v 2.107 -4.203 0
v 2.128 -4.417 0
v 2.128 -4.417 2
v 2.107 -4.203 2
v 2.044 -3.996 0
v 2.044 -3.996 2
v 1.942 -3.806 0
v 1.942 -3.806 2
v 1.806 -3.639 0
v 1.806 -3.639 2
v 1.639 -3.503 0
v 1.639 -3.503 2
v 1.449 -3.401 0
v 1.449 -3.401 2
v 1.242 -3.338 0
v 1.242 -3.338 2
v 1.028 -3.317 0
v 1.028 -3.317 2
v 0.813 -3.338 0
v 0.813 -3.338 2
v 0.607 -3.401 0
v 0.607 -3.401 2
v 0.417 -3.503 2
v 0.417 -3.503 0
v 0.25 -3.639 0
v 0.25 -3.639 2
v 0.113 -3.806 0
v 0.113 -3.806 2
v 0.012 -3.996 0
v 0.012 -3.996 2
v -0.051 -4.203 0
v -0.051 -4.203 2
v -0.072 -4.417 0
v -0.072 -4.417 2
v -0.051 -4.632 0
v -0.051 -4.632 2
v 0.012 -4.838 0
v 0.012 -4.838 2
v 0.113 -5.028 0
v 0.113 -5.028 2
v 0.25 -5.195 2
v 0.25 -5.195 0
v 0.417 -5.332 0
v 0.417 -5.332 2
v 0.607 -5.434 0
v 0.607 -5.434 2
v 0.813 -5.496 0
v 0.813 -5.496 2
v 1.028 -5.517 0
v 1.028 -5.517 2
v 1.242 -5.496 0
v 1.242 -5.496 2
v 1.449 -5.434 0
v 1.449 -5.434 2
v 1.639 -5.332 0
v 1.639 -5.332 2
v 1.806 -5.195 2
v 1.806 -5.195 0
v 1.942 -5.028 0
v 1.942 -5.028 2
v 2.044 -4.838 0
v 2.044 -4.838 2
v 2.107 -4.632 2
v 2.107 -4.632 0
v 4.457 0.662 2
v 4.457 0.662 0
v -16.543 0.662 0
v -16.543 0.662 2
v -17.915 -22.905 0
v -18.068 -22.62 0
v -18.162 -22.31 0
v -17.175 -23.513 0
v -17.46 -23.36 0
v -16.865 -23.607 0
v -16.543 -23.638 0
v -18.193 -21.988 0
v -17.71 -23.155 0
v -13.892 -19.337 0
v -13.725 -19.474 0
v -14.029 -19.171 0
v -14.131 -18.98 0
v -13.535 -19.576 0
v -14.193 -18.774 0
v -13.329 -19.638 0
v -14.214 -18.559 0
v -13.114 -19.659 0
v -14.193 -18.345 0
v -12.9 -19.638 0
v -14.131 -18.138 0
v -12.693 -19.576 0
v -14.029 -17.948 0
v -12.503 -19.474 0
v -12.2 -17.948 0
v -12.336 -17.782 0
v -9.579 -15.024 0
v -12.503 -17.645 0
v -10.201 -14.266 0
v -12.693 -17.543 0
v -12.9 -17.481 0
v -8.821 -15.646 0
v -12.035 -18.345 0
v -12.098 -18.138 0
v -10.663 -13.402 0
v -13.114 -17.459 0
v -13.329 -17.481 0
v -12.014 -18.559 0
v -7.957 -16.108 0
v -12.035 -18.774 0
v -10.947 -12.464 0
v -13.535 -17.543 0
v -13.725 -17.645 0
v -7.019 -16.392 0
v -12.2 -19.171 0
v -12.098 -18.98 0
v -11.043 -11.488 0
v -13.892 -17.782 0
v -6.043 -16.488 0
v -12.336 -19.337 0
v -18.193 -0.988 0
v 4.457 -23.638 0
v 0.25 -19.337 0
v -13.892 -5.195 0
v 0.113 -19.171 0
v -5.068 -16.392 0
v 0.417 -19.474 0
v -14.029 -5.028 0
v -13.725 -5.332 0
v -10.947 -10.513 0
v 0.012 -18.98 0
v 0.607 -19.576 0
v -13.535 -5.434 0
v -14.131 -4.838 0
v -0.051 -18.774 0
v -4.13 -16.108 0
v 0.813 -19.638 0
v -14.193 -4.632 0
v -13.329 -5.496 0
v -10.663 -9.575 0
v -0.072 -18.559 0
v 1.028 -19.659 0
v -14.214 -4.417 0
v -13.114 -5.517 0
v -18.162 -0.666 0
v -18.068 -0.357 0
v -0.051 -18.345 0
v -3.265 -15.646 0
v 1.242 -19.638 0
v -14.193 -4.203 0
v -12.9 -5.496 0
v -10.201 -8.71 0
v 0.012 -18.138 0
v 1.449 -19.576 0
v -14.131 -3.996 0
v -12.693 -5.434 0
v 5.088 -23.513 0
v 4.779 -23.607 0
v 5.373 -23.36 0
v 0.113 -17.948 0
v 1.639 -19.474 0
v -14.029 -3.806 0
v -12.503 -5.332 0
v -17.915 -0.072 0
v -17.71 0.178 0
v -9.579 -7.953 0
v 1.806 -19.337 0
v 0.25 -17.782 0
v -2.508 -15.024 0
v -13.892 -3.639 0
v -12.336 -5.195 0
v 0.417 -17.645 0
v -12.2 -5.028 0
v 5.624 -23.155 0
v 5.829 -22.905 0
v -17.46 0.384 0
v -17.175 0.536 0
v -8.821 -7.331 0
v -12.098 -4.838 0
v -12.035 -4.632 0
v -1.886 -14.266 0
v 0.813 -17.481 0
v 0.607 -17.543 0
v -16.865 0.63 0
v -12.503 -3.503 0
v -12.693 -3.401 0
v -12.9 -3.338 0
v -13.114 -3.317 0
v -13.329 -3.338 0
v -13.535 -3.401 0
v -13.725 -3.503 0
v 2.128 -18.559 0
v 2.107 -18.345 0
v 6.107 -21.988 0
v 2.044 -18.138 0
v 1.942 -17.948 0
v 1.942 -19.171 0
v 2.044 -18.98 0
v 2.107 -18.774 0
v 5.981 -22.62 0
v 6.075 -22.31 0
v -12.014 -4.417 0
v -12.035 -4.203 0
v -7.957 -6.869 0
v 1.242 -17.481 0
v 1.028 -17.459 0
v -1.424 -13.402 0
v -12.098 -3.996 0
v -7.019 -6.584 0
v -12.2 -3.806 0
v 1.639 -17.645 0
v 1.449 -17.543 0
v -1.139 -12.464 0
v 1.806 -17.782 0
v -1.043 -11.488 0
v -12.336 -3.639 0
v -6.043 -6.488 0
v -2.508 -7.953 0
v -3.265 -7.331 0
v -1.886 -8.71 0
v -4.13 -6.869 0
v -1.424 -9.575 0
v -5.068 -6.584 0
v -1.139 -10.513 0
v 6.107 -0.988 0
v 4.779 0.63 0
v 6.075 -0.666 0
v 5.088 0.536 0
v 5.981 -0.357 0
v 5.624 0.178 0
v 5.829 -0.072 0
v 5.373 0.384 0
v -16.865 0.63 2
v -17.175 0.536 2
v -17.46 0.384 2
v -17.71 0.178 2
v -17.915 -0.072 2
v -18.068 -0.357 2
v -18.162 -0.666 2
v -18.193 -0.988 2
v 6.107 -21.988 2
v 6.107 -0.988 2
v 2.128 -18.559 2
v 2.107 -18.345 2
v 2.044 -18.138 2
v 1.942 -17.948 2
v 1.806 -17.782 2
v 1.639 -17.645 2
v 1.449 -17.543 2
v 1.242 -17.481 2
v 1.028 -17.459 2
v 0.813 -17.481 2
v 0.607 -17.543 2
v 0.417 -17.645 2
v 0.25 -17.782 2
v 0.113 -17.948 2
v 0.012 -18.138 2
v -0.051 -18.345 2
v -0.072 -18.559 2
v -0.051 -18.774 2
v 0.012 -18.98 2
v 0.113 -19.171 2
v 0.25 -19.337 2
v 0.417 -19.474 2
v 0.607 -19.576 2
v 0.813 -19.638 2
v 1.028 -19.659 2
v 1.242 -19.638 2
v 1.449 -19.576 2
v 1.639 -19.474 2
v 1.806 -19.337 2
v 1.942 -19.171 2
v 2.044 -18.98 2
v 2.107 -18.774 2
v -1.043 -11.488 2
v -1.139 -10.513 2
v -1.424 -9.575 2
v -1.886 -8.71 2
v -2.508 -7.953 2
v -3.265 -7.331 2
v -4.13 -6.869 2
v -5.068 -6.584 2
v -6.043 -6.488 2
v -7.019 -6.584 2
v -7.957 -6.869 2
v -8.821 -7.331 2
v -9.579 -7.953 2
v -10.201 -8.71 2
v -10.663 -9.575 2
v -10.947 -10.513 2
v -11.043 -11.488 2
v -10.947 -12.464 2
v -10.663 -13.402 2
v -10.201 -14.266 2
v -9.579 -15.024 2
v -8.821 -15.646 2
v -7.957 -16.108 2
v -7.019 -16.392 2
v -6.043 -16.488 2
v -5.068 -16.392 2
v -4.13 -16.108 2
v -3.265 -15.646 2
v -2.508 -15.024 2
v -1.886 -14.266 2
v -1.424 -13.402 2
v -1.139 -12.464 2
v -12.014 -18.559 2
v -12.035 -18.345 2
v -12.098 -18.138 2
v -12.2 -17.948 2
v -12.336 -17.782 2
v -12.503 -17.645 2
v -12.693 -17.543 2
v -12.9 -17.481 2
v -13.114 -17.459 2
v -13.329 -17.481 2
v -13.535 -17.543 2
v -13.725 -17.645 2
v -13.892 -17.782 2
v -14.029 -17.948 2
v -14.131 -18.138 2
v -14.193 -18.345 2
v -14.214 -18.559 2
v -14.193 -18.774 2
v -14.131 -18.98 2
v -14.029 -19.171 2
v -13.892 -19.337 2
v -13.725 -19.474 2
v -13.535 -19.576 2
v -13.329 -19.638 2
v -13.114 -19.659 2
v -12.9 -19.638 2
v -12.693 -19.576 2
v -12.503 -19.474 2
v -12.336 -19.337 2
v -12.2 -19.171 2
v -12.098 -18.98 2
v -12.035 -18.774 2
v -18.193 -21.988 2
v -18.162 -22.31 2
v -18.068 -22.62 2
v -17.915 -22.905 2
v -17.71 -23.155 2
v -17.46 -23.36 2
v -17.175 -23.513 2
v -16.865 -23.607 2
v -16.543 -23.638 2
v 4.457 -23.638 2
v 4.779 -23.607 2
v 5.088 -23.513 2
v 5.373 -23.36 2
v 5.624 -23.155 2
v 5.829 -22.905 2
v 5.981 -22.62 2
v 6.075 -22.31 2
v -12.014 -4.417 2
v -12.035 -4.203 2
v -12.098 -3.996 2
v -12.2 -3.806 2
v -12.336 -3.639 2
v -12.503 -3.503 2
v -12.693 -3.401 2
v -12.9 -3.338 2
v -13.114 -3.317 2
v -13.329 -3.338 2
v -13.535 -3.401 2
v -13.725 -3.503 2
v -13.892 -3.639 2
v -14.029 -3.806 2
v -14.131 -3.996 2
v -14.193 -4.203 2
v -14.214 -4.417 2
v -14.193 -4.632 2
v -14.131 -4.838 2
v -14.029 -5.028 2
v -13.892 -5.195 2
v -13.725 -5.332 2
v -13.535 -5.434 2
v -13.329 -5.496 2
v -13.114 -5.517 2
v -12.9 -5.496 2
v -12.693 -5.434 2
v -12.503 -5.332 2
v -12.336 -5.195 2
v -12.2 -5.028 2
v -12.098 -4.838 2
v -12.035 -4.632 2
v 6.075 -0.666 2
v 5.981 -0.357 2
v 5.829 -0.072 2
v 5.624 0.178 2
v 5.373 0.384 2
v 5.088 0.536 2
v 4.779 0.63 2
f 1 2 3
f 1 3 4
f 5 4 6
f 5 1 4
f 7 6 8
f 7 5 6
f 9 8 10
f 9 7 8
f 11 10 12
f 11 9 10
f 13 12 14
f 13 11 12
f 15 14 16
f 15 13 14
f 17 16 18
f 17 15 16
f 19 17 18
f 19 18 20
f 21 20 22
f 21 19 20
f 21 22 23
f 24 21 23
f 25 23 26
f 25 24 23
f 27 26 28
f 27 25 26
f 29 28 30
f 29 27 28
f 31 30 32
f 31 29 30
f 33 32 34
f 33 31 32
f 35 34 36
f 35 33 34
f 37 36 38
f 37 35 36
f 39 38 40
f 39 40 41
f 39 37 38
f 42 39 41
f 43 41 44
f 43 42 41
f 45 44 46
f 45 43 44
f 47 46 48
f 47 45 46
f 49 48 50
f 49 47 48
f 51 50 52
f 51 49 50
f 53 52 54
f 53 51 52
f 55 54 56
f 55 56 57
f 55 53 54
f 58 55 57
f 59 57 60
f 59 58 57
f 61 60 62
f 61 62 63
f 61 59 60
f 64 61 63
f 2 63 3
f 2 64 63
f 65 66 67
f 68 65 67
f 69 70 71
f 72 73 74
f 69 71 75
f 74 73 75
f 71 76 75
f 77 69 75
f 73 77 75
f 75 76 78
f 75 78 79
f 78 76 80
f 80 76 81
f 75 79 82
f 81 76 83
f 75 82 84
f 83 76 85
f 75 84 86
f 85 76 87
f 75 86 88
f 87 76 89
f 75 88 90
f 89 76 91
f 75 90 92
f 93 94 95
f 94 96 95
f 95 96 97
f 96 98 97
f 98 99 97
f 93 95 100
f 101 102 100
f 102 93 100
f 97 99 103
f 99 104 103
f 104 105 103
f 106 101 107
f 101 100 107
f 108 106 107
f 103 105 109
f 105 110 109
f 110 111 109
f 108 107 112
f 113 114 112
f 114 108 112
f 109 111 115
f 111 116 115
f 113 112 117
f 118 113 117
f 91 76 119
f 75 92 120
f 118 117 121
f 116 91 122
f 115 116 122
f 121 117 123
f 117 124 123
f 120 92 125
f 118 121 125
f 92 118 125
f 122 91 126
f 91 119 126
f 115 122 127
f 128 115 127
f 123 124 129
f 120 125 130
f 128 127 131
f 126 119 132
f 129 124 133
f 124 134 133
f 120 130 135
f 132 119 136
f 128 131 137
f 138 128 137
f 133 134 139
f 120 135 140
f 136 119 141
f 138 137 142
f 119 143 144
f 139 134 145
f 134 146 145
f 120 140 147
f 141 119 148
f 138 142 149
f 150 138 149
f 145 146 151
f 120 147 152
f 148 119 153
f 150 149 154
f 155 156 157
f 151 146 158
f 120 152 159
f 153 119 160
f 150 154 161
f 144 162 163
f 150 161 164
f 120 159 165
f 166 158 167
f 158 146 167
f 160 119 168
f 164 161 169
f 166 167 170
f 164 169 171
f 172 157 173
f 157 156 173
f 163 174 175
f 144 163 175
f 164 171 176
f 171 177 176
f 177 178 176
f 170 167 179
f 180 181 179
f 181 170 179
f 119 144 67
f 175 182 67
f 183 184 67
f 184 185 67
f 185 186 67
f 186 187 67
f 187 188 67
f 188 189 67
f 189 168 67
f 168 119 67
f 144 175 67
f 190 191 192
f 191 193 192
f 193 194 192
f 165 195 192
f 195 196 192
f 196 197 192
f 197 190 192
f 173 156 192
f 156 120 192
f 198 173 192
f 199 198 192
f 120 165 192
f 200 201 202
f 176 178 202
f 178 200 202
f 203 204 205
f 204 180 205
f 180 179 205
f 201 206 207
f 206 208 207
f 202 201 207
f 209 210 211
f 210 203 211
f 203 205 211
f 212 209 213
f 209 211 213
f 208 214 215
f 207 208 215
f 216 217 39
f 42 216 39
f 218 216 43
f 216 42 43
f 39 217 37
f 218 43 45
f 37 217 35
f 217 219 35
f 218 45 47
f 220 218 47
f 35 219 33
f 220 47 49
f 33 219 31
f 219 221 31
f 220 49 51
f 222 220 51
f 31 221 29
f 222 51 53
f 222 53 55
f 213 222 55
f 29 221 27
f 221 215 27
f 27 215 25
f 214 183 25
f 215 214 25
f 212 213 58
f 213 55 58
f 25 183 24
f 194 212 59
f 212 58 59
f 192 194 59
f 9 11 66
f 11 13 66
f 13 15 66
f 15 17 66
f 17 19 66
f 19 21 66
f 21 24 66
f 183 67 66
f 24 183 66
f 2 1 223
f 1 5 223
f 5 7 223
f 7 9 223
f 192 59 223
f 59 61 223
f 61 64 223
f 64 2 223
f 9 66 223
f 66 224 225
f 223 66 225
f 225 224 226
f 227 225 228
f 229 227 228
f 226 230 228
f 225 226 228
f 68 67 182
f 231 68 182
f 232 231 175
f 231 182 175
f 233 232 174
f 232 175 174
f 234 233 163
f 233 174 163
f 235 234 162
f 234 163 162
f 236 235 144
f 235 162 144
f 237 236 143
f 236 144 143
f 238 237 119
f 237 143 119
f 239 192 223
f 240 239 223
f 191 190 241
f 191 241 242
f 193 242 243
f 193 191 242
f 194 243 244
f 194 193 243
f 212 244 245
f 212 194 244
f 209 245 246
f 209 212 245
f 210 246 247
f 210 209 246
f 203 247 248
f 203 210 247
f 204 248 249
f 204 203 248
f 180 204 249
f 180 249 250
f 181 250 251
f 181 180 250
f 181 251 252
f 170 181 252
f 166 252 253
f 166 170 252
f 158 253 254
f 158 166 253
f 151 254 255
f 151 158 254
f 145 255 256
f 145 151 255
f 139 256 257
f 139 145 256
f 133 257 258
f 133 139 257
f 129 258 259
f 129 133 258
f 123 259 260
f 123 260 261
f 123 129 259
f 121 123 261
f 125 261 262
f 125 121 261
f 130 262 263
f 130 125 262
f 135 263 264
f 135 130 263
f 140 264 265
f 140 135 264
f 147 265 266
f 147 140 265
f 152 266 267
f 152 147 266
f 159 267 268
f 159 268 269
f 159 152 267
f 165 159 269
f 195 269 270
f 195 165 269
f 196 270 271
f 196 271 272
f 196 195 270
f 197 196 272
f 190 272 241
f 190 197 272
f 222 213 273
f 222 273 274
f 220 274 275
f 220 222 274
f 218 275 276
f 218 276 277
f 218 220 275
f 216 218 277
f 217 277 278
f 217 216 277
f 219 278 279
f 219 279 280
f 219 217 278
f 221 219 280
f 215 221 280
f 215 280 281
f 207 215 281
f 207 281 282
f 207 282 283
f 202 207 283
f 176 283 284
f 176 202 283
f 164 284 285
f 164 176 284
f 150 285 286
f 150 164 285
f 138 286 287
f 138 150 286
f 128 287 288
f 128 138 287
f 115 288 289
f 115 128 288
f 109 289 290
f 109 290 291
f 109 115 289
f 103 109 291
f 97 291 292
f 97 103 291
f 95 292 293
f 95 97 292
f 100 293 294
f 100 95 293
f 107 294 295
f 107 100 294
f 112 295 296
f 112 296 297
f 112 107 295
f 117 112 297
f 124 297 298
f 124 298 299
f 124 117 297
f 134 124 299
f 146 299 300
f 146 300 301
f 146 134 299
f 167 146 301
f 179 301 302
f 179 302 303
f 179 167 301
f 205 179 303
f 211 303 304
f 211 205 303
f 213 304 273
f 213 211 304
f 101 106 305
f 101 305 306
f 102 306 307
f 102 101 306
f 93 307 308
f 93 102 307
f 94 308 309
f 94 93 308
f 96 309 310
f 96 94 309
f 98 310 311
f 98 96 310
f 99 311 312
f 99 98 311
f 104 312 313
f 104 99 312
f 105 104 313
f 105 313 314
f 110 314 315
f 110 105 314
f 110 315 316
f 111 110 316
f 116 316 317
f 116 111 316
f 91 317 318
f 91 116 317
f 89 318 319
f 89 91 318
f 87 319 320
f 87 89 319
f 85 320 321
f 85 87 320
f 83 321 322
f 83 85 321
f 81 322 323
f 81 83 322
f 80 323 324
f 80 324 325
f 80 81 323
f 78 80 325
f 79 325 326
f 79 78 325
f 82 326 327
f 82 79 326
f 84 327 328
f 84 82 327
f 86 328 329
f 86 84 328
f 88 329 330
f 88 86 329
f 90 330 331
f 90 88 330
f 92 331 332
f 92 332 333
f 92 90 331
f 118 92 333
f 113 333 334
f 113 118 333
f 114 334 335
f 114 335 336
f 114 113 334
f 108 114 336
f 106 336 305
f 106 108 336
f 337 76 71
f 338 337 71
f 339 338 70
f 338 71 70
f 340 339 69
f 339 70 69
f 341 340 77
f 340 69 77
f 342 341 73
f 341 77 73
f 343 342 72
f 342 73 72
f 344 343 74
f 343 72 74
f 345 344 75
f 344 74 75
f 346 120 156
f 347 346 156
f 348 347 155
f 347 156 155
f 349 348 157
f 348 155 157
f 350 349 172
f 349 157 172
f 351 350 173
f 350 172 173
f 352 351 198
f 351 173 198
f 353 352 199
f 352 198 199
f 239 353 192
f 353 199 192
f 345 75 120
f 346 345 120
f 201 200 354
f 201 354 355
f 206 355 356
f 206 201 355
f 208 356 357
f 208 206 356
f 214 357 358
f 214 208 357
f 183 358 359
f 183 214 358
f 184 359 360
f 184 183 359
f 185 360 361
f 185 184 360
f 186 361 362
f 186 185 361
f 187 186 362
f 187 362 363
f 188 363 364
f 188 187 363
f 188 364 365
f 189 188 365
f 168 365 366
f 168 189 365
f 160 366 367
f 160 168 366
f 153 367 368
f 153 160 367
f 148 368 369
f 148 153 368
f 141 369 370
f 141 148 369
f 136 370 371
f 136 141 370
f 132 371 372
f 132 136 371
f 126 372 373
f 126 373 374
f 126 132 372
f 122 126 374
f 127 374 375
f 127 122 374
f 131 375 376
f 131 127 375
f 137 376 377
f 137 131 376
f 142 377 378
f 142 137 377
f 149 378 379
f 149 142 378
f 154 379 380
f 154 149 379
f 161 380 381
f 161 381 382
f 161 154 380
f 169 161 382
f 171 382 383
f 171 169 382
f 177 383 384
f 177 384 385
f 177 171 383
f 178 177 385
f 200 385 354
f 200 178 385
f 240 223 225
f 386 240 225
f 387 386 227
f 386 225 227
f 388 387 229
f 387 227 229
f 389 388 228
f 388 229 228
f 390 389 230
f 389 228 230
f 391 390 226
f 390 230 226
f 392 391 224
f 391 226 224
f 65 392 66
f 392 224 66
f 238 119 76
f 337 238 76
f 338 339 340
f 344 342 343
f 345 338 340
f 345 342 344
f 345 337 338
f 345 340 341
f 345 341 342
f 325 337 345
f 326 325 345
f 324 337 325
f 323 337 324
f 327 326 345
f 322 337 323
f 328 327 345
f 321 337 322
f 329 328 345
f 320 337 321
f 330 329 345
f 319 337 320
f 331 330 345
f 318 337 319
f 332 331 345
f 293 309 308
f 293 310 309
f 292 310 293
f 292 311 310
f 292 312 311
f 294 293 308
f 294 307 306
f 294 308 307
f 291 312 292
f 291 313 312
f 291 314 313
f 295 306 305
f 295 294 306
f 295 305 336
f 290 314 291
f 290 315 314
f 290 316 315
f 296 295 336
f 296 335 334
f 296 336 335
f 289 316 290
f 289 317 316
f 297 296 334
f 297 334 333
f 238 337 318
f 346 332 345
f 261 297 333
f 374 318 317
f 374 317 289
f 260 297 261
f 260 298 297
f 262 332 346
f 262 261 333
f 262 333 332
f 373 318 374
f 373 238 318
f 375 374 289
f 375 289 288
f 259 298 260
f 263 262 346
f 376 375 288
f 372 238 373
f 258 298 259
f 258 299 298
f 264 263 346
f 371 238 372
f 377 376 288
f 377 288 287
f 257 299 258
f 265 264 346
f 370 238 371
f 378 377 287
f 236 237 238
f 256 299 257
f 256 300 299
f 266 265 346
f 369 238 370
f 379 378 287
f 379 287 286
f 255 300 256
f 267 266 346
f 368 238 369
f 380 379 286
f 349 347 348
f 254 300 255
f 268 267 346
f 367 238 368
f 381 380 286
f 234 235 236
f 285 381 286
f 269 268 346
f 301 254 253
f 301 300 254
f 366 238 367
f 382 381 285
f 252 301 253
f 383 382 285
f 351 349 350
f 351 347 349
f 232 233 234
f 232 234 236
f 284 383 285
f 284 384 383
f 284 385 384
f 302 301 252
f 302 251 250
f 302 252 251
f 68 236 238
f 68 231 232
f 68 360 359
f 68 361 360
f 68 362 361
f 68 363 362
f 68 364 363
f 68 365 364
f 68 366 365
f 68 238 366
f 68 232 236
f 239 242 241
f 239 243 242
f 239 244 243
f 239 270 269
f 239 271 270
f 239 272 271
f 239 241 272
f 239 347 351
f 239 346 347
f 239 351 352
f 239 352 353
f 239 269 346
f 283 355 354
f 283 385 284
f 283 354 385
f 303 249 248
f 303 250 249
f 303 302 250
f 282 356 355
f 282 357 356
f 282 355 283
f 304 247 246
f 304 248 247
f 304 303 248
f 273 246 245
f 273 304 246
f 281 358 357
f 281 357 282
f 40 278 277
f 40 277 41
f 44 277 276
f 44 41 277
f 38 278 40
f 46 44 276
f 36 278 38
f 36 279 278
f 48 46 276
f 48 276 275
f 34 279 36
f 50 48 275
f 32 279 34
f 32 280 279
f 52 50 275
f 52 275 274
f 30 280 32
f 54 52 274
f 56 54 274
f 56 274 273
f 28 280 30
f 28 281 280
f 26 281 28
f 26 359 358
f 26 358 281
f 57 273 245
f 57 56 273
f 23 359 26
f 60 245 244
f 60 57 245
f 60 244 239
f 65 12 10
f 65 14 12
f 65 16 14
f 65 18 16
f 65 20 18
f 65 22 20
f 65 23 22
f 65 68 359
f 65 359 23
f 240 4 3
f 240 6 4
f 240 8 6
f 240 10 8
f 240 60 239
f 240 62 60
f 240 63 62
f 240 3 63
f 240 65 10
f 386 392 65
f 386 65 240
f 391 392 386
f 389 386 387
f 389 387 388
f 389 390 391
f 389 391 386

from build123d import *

# Parameters (mm, degrees)
CROQUIS1_R              = 5
CROQUIS1_R_2            = 1.1
SALIENTE_EXTRUIR1_DEPTH = 2
CORTAR_EXTRUIR1_START   = -2
CORTAR_EXTRUIR1_DEPTH   = 2


with BuildPart() as part:
    # Croquis1 → Saliente-Extruir1 (new body)
    with BuildSketch(Plane.XY):
        with BuildLine():
            Line((-18.543218985, -0.988325299), (-18.543218985, -21.988325299))
            ThreePointArc((-18.543218985, -21.988325299), (-17.957432547, -23.402538861), (-16.543218985, -23.988325299))
            Line((-16.543218985, -23.988325299), (4.456781015, -23.988325299))
            ThreePointArc((4.456781015, -23.988325299), (5.870994578, -23.402538861), (6.456781015, -21.988325299))
            Line((6.456781015, -21.988325299), (6.456781015, -0.988325299))
            ThreePointArc((6.456781015, -0.988325299), (5.870994578, 0.425888264), (4.456781015, 1.011674701))
            Line((4.456781015, 1.011674701), (-16.543218985, 1.011674701))
            ThreePointArc((-16.543218985, 1.011674701), (-17.957432547, 0.425888264), (-18.543218985, -0.988325299))
        make_face()
        with Locations((-6.043218985, -11.488325299)):
            Circle(CROQUIS1_R, mode=Mode.SUBTRACT)
        with Locations((-13.114286796, -4.417257487)):
            Circle(CROQUIS1_R_2, mode=Mode.SUBTRACT)
        with Locations((1.027848827, -4.417257487)):
            Circle(CROQUIS1_R_2, mode=Mode.SUBTRACT)
        with Locations((-13.114286796, -18.559393111)):
            Circle(CROQUIS1_R_2, mode=Mode.SUBTRACT)
        with Locations((1.027848827, -18.559393111)):
            Circle(CROQUIS1_R_2, mode=Mode.SUBTRACT)
    extrude(amount=SALIENTE_EXTRUIR1_DEPTH)

    # Croquis2 → Cortar-Extruir1 (cut)
    with BuildSketch(Plane.XY.offset(2).offset(CORTAR_EXTRUIR1_START)):
        with BuildLine():
            Line((4.456781015, 1.011674701), (-16.543218985, 1.011674701))
            ThreePointArc((-16.543218985, 1.011674701), (-17.957432547, 0.425888264), (-18.543218985, -0.988325299))
            Line((-18.543218985, -0.988325299), (-18.543218985, -21.988325299))
            ThreePointArc((-18.543218985, -21.988325299), (-17.957432547, -23.402538861), (-16.543218985, -23.988325299))
            Line((-16.543218985, -23.988325299), (4.456781015, -23.988325299))
            ThreePointArc((4.456781015, -23.988325299), (5.870994578, -23.402538861), (6.456781015, -21.988325299))
            Line((6.456781015, -21.988325299), (6.456781015, -0.988325299))
            ThreePointArc((6.456781015, -0.988325299), (5.870994578, 0.425888264), (4.456781015, 1.011674701))
        make_face()
        with BuildLine():
            Line((-18.193218985, -0.988325299), (-18.193218985, -21.988325299))
            ThreePointArc((-18.193218985, -21.988325299), (-17.709945174, -23.155051488), (-16.543218985, -23.638325299))
            Line((-16.543218985, -23.638325299), (4.456781015, -23.638325299))
            ThreePointArc((4.456781015, -23.638325299), (5.623507204, -23.155051488), (6.106781015, -21.988325299))
            Line((6.106781015, -21.988325299), (6.106781015, -0.988325299))
            ThreePointArc((6.106781015, -0.988325299), (5.623507204, 0.17840089), (4.456781015, 0.661674701))
            Line((4.456781015, 0.661674701), (-16.543218985, 0.661674701))
            ThreePointArc((-16.543218985, 0.661674701), (-17.709945174, 0.17840089), (-18.193218985, -0.988325299))
        make_face(mode=Mode.SUBTRACT)
    extrude(amount=CORTAR_EXTRUIR1_DEPTH, mode=Mode.SUBTRACT)


solid = part.part
